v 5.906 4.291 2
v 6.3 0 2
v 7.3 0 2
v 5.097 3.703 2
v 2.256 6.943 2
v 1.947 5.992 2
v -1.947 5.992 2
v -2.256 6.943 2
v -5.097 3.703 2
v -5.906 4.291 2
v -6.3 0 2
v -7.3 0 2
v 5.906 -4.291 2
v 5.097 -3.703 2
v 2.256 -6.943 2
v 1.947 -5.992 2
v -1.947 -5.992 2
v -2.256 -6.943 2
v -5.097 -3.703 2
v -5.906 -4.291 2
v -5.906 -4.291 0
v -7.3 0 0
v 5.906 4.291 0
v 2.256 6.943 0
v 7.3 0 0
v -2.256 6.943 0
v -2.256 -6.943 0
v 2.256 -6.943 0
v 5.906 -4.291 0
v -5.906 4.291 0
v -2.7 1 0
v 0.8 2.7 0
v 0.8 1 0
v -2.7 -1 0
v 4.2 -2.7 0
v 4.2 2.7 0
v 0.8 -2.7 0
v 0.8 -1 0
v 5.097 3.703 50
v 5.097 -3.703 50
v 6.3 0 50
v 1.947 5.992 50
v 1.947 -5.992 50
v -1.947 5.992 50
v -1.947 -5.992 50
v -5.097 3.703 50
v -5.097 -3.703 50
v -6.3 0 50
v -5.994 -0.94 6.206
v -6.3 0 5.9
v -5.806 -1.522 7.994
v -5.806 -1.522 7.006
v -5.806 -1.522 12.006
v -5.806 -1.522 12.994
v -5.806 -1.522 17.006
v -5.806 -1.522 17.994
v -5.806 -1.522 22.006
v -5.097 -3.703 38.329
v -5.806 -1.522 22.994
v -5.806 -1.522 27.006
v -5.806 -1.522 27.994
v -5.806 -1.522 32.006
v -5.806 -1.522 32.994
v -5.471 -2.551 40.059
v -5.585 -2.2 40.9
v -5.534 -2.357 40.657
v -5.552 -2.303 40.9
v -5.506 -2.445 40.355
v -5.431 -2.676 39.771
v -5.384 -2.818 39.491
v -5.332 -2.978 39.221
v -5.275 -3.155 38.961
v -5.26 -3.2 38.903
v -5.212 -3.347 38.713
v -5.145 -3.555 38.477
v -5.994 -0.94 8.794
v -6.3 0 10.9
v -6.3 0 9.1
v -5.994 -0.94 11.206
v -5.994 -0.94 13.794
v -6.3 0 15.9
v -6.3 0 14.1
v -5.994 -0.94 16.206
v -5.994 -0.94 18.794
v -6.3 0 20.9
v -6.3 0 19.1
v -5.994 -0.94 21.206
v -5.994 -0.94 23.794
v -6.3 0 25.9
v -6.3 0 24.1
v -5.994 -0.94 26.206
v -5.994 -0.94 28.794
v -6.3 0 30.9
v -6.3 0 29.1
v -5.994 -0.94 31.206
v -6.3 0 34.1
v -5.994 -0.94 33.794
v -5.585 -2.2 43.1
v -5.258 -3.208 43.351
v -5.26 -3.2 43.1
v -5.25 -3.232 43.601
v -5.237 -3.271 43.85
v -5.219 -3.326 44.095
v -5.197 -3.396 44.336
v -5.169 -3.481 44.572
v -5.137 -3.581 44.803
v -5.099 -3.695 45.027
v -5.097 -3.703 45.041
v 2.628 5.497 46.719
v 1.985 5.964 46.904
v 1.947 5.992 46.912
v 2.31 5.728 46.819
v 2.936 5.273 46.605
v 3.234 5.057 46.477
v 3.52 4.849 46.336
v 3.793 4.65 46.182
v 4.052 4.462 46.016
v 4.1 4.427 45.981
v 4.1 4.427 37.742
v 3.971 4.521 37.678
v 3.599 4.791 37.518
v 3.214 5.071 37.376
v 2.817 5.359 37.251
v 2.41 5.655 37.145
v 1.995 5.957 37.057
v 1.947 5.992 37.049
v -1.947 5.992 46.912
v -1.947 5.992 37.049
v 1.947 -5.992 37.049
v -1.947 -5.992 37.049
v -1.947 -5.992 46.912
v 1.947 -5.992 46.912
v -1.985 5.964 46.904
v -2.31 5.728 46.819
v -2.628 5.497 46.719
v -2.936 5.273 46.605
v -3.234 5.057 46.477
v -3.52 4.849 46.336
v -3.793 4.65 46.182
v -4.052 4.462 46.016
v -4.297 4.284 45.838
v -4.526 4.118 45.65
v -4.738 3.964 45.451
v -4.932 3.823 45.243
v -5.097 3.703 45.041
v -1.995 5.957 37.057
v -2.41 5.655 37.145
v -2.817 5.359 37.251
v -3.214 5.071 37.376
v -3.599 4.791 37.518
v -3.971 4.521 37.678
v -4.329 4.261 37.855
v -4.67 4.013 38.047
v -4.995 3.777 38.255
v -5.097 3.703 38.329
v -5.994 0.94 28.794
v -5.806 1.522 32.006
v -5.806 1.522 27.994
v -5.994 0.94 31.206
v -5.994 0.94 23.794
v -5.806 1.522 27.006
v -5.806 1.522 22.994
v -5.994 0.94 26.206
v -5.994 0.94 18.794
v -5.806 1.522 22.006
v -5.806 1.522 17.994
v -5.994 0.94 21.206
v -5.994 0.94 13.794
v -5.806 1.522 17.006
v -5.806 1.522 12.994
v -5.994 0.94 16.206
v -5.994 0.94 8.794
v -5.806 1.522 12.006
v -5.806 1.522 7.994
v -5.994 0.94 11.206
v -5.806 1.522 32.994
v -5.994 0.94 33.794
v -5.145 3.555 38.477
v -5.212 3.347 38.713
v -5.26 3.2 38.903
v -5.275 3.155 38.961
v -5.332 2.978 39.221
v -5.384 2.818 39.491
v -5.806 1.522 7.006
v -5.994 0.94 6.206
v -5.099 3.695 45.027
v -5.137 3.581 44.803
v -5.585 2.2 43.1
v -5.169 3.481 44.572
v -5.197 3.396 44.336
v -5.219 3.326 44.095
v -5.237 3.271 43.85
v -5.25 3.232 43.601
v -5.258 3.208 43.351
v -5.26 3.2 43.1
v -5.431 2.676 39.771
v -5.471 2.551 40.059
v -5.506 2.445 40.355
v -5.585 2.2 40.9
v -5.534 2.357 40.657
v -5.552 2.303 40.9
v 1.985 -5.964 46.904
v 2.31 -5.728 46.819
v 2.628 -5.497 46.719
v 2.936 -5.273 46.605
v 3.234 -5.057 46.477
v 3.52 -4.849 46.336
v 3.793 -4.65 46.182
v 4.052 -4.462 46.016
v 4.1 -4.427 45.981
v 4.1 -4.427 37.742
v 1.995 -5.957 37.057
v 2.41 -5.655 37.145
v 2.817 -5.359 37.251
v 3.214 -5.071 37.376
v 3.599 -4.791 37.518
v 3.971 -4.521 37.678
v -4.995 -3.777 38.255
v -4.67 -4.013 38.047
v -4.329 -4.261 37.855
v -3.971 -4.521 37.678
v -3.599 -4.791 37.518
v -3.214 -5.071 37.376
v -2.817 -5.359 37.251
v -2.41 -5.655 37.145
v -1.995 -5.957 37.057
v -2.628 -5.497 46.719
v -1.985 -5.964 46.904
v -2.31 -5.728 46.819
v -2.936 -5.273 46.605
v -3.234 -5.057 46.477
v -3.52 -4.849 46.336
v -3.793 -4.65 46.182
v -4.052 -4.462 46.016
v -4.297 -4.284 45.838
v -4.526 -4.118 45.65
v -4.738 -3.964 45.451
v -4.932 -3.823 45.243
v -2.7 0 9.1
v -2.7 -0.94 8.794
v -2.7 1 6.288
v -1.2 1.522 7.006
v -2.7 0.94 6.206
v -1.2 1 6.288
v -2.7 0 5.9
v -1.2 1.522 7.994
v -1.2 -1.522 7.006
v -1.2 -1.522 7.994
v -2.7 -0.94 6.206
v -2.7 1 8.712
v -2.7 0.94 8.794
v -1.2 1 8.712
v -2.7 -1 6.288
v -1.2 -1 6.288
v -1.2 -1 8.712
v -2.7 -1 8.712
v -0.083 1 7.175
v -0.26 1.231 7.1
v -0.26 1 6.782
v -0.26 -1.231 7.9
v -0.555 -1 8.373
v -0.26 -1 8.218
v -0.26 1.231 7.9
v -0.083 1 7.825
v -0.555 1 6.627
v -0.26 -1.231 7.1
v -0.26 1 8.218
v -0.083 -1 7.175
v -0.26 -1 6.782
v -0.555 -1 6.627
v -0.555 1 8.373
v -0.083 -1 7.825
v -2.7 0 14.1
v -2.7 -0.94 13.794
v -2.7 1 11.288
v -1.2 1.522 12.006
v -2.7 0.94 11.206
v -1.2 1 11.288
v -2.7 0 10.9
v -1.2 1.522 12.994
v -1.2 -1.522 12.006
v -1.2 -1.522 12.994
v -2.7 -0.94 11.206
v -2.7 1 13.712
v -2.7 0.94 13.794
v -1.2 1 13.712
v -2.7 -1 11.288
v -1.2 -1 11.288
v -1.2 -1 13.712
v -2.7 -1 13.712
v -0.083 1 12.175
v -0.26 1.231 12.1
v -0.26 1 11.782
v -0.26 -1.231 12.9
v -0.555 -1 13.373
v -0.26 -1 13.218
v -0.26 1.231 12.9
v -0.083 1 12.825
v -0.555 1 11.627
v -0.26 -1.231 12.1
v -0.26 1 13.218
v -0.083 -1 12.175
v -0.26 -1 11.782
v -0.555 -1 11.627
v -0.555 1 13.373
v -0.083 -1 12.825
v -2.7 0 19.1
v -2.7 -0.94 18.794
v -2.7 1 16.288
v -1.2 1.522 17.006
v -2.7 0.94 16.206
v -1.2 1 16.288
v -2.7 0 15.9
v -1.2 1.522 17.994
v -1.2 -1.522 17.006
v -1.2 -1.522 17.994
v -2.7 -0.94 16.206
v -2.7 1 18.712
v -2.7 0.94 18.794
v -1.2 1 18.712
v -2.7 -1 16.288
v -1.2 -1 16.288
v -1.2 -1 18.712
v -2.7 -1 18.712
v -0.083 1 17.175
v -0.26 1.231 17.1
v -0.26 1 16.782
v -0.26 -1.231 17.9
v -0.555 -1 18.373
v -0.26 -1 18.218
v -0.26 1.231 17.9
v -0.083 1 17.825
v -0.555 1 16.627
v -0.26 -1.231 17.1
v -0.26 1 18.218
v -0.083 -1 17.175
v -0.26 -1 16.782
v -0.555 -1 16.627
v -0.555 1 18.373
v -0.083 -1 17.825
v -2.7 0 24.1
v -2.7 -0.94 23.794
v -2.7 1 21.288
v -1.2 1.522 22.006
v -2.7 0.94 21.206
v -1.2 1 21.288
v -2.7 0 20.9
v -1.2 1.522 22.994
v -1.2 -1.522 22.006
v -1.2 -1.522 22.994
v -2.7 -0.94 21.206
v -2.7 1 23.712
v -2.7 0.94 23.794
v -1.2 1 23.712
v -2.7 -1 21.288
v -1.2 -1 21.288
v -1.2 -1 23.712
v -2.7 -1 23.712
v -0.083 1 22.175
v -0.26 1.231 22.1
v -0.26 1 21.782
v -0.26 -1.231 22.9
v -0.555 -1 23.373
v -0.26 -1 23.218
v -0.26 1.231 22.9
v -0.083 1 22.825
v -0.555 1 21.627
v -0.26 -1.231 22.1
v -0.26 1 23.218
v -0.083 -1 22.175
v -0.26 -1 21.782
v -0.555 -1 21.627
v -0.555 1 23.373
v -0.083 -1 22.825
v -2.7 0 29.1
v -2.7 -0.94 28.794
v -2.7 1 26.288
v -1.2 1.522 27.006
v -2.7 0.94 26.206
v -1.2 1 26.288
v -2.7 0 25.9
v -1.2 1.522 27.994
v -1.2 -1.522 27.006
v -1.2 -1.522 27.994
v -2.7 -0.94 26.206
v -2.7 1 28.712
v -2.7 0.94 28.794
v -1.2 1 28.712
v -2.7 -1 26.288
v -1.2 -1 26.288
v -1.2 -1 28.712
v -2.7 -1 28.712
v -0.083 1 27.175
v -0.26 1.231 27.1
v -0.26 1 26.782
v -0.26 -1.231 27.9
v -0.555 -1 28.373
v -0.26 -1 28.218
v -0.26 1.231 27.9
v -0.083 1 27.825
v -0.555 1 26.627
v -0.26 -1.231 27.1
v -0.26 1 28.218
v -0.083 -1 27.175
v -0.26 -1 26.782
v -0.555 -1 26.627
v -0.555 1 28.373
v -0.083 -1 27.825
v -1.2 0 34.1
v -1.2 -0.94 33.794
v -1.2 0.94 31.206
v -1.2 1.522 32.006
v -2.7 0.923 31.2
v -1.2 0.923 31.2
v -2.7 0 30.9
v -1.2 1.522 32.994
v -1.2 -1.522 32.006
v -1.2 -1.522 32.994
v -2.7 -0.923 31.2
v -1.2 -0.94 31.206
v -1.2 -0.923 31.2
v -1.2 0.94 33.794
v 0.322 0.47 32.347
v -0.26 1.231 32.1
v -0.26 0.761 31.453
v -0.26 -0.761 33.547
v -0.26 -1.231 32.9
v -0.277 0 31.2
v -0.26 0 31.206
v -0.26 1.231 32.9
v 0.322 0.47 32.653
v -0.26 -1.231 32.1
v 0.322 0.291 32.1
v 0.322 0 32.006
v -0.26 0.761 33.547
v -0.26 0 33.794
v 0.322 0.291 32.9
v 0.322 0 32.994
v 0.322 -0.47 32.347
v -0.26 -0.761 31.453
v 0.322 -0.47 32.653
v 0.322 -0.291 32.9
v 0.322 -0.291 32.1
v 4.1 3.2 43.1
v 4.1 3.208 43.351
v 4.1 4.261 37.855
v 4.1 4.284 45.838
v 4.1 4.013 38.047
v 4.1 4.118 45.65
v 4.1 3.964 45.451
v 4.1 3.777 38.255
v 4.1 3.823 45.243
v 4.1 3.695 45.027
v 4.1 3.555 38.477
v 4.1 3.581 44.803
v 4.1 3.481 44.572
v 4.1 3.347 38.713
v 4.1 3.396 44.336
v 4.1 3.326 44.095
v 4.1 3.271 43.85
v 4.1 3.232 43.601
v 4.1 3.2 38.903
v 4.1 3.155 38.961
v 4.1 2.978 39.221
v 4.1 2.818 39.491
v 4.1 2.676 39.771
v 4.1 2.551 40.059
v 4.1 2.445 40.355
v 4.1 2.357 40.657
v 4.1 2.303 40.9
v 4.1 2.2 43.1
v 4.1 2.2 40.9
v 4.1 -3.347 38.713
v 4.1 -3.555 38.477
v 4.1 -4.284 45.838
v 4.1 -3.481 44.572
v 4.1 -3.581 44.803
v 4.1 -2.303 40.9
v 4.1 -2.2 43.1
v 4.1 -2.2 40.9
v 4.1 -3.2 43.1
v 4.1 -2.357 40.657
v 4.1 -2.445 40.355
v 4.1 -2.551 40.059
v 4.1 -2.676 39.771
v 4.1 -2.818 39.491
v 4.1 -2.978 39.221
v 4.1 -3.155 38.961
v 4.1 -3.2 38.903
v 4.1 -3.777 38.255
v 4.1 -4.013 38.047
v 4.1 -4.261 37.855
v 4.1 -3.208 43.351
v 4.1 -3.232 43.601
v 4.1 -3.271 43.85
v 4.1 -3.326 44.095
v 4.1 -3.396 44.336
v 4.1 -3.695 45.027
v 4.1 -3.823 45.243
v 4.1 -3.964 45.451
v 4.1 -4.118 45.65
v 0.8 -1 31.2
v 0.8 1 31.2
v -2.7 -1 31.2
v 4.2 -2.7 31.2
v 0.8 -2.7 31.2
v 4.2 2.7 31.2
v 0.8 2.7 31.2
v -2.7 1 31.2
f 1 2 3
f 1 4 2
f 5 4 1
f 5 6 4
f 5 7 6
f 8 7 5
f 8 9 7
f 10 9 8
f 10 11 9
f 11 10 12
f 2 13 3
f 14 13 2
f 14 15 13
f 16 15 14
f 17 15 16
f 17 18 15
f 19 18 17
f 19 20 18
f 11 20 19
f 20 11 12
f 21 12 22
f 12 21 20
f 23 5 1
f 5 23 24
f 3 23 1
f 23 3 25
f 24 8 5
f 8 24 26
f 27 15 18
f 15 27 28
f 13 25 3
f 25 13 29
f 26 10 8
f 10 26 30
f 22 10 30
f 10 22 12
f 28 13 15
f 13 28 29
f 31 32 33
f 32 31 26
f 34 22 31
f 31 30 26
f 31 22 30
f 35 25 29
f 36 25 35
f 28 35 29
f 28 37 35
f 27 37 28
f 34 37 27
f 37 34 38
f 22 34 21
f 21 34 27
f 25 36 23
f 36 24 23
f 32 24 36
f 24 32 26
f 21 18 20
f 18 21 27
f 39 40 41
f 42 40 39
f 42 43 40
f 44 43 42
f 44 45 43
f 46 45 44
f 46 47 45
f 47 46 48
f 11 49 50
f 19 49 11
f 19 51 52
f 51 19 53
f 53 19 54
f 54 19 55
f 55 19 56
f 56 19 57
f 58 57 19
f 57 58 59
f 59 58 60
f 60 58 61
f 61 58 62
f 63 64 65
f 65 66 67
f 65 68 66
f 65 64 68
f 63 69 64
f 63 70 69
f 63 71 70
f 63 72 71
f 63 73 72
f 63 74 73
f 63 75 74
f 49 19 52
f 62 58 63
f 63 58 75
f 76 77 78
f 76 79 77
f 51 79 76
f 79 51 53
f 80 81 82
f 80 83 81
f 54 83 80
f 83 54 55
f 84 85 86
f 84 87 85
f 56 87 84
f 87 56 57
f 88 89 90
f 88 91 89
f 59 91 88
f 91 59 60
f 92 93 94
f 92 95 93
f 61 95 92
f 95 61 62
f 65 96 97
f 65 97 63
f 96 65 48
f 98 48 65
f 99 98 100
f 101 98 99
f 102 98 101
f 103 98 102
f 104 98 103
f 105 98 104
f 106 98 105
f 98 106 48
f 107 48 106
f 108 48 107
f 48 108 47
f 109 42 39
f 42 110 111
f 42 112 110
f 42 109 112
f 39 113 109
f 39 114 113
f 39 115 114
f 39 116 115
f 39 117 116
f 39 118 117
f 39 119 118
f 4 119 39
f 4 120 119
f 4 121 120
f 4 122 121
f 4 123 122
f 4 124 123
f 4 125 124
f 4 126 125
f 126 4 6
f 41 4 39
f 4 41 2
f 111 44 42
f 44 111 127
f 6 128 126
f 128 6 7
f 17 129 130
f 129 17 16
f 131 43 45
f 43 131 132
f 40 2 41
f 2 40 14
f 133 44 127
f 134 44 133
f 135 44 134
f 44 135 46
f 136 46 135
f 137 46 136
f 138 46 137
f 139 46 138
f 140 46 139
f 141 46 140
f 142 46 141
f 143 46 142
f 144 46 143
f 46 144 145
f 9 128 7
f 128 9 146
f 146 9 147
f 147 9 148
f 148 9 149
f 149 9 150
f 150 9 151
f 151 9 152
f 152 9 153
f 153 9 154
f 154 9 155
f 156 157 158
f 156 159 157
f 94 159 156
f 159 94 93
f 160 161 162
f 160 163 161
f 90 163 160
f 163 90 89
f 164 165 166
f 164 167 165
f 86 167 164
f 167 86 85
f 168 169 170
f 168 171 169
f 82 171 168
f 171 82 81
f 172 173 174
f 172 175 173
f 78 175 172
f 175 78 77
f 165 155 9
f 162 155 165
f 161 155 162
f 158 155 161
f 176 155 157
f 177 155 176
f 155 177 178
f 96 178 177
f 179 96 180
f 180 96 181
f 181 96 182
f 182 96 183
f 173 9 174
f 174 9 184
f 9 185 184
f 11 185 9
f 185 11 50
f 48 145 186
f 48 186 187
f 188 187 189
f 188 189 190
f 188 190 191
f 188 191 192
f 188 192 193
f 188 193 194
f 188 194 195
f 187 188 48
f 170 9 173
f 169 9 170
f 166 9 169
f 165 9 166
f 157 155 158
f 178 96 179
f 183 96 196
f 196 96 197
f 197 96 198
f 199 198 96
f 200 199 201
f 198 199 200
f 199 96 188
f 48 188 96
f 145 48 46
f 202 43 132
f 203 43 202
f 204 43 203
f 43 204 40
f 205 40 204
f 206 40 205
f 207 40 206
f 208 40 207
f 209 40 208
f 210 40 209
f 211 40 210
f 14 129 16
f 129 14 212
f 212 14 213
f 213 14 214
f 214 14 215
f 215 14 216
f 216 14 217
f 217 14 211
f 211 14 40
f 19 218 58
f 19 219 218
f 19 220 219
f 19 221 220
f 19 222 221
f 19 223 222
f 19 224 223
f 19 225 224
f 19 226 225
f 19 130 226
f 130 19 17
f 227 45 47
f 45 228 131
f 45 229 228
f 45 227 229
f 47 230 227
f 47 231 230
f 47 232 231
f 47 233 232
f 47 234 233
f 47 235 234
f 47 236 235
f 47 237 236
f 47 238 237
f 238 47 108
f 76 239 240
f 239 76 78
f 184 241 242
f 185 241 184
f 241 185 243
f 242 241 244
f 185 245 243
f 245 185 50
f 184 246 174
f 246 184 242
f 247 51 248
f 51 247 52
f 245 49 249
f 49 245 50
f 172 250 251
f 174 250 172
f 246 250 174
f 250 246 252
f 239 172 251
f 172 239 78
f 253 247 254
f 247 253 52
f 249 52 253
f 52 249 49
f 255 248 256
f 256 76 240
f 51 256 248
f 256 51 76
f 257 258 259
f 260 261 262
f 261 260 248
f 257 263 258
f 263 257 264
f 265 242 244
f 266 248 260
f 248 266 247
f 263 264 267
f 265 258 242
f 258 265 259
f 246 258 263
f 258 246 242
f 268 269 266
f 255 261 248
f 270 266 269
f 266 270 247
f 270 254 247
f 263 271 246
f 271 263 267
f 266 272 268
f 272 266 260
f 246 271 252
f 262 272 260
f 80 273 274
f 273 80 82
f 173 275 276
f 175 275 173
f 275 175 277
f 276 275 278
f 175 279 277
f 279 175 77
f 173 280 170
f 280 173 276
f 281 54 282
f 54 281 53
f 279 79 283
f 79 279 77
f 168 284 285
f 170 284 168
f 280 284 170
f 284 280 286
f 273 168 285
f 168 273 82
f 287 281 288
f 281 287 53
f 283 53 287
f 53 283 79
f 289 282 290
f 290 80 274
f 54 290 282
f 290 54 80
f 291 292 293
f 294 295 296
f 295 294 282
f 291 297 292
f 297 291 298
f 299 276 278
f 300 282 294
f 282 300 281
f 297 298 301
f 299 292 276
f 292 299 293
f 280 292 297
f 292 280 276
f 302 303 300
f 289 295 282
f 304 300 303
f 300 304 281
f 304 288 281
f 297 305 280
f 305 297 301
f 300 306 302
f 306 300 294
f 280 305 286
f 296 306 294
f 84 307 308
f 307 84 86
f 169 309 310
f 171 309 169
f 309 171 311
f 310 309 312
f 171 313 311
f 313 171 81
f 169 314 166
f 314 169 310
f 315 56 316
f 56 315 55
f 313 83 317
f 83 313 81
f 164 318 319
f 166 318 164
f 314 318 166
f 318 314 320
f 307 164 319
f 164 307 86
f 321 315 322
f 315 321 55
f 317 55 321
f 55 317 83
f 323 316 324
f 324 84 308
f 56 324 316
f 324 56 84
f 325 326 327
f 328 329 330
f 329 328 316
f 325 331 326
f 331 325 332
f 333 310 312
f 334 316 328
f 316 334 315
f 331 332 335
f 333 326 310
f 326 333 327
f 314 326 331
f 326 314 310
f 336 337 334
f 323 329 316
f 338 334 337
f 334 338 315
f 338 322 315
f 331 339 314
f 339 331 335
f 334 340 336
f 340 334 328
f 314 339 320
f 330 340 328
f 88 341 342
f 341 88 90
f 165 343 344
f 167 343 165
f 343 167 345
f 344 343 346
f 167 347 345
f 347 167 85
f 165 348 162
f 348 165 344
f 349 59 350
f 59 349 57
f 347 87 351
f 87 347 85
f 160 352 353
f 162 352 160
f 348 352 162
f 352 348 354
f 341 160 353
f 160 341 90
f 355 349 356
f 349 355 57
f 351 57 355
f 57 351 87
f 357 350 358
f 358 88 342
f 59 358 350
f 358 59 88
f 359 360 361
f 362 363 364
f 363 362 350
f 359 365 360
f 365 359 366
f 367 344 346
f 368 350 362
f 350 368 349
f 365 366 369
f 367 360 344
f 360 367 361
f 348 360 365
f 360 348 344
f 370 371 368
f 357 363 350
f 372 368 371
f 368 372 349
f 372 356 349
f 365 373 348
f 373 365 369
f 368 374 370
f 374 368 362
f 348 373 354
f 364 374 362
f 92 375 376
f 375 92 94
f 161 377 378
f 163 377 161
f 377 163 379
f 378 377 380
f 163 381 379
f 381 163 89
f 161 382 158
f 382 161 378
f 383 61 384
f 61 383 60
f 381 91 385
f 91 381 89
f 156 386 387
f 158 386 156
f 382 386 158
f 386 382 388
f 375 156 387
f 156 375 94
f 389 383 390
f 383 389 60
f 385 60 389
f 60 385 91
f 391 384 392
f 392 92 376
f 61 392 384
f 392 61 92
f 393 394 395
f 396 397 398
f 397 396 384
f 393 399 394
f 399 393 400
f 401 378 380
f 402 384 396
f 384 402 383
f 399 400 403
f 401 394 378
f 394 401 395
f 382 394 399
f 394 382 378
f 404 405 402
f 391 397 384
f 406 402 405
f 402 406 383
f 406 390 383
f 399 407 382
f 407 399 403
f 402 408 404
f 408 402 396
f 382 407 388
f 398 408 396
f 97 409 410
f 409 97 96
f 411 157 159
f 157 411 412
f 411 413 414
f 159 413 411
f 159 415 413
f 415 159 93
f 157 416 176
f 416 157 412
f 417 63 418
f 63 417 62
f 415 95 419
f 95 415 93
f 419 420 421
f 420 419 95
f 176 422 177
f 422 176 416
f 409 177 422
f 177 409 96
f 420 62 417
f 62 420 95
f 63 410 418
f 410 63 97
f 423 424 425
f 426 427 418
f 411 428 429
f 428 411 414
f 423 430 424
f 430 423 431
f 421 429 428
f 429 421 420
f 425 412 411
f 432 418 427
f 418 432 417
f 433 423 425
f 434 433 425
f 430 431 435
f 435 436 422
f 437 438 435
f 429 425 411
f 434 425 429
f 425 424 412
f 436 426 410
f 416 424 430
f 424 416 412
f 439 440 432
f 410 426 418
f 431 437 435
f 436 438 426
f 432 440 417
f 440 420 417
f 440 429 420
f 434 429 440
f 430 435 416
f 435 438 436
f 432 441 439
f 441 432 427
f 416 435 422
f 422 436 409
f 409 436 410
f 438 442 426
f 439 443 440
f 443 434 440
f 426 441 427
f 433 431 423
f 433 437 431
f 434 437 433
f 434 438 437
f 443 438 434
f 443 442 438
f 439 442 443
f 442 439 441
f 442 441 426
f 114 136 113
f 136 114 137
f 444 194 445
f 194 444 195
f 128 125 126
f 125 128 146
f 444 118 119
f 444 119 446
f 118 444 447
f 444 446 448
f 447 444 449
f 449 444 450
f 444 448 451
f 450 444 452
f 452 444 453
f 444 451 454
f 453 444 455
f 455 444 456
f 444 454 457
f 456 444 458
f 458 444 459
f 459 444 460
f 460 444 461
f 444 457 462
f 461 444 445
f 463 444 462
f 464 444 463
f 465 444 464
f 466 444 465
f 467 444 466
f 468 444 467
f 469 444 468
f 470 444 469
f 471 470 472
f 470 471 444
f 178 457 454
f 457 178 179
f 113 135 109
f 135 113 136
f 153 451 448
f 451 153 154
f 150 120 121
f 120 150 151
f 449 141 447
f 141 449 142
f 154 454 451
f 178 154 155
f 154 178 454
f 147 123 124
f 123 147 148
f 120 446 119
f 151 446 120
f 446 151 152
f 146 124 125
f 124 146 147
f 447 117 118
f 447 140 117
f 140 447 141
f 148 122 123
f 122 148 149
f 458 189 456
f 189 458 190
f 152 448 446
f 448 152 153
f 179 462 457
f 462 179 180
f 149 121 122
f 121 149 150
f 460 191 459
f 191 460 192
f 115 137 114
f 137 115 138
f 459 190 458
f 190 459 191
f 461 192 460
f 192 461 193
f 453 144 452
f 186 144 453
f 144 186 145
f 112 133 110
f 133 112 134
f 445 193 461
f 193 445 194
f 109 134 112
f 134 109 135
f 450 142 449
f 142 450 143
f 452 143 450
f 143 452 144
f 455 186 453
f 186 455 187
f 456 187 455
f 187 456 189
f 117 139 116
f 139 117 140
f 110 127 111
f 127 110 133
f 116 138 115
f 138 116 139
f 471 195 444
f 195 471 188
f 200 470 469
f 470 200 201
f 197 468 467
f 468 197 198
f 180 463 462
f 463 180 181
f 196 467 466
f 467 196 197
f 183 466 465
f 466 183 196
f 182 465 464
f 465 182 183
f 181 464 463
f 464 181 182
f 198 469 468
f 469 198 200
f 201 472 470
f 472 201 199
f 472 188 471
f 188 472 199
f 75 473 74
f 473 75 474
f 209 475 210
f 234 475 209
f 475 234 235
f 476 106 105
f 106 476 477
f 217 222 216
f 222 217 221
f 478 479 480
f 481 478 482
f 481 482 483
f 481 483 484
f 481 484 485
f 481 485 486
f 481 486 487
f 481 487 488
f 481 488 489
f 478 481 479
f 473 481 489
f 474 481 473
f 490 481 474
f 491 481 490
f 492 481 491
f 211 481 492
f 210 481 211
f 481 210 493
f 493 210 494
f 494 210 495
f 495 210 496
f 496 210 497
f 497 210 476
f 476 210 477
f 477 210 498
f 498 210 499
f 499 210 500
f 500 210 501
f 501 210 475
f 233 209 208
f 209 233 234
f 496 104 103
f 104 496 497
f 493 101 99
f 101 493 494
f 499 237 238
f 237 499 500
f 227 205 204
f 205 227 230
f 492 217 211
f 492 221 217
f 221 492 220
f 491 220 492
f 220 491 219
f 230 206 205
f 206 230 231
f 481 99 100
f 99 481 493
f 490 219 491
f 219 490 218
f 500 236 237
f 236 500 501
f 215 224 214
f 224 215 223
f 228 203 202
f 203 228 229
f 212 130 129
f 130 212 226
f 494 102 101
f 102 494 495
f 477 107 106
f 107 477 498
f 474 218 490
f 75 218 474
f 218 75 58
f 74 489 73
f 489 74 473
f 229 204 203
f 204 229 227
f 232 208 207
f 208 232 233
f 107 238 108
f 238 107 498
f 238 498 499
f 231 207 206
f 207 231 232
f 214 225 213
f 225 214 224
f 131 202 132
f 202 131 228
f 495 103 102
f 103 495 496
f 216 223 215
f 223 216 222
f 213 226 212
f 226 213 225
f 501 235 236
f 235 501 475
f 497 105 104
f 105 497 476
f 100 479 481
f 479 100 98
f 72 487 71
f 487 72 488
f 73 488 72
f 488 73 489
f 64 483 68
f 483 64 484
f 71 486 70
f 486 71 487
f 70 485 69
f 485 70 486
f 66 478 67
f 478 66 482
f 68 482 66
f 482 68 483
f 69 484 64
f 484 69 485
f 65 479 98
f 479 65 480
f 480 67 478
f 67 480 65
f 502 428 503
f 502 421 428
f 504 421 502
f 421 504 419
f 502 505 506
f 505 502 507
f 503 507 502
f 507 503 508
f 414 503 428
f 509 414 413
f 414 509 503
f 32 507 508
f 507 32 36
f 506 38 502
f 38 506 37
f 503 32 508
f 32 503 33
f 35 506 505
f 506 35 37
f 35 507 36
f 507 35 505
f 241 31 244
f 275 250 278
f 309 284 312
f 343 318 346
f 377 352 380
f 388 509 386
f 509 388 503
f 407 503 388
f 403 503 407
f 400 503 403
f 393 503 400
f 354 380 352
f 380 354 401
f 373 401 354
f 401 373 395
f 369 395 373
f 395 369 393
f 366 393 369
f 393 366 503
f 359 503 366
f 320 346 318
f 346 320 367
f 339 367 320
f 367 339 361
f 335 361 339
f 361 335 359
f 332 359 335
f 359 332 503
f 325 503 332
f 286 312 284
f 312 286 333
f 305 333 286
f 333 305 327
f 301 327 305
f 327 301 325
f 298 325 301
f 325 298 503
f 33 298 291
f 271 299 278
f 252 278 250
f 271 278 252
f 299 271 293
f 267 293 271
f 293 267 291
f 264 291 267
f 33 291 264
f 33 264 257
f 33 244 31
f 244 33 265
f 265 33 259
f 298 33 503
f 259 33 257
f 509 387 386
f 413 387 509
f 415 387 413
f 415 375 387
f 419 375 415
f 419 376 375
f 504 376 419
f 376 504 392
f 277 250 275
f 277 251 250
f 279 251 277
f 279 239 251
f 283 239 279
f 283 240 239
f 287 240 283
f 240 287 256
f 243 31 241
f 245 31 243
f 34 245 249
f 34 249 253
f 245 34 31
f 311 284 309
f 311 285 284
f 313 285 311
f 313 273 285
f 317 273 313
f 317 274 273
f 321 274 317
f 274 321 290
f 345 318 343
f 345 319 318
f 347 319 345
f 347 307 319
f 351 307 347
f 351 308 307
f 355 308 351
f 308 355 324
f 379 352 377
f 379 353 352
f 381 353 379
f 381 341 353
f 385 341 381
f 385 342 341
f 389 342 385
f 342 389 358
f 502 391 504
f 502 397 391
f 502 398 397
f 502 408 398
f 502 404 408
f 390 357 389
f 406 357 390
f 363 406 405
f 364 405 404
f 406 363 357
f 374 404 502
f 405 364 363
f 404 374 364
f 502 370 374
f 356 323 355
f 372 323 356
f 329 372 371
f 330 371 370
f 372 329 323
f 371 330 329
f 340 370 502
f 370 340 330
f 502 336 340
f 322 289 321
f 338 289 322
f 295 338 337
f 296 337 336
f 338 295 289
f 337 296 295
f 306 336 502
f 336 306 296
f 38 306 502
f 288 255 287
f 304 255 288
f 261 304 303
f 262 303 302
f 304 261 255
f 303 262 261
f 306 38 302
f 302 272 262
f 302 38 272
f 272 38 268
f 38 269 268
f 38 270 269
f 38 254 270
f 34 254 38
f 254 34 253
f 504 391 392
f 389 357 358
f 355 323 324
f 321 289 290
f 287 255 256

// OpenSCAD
// file: util.scad
module space(size){
  minkowski() {
	children(0);
	cube(size, center=true);
    //sphere(size, center=true,$fn=30);  
  }
}

module pinHole(length){
    PIN_DIAMETER = 3.2;
    rotate([0,90,0]){
      cylinder(d=PIN_DIAMETER,h=length,center=false); //The lip
      translate([0,0,length])
        sphere(d=PIN_DIAMETER);  
    }
}

function coreDiameter() = 12.6;

function coreLipDiameter() = coreDiameter()+2;

function padlockWidth() = 3+8+8+12.6+3+3;

function padlockDepth() = 4+5+5+5+5+5+5+6+18;

function padlockHeight() = 24;

function pin1Depth() = 7.5;
function pin2Depth() = 12.5;
function pin3Depth() = 17.5;
function pin4Depth() = 22.5;
function pin5Depth() = 27.5;
function pin6Depth() = 32.5;
// file: bearing.scad
function bearingOuterDiameter() = 8; //The diameter of the circle facing the shackle
function bearingInnerDiameter() = 10; //The diameter of the circle facing the core


$fn=100;

height = 10;

module bearing(){

  difference(){
    cylinder(d=bearingOuterDiameter(),h=height);
    translate([0,-bearingOuterDiameter()/2,0])
      cube([bearingOuterDiameter(),bearingOuterDiameter(),height]);
  }
  
  translate([0,-bearingInnerDiameter()/2,0])
    cube([2,bearingInnerDiameter(),height]);
  translate([1,0,0])
    difference(){  
       cylinder(d=bearingInnerDiameter(),h=height);
       translate([-bearingInnerDiameter(),-bearingInnerDiameter()/2,0])
         cube([bearingInnerDiameter(),bearingInnerDiameter(),height]);
    }

}

bearing();
// file: key.scad
SHAFT_LENGTH = 28;
BOW_FLAT = 9;
KEY_HEIGHT = 3;

module keyShaftEnd(length){
    difference(){
      keyShaft(length);
      translate([-5,-5,length-4])
        rotate([35,0,0])
          cube([15,10,10]);
     
    }

}

module keyShaft(length){
    linear_extrude(height=length)
      polygon([[-0.5,0],[-0.5,KEY_HEIGHT],[4.5,KEY_HEIGHT],[4.5,0],[2.8,0],[2.8,-3.5],[1.2,-3.5],[1.2,0]]);
}

module keyBow(){
  linear_extrude(height=KEY_HEIGHT)  
      difference(){
        circle(d=20,$fn=100); 
        translate([-10,BOW_FLAT,0])  
          square([20,10]);
        translate([0,-5,0])    
          circle(d=5,$fn=100);  
      }
}

module key(){
   translate([-2,BOW_FLAT,KEY_HEIGHT]) 
     rotate([-90,0,0])
       keyShaft(SHAFT_LENGTH);
   translate([-2,BOW_FLAT+SHAFT_LENGTH-0.01,KEY_HEIGHT]) 
     rotate([-90,0,0])
       keyShaftEnd(4); 
   keyBow();    
}

key();

//keyShaftEnd(10);
// main file
$fn=10;
CORE_HEIGHT = 15+6+25+2;
LIP_HEIGHT = 2;
SNUGNESS = 0.2;

use <key.scad>
use <bearing.scad>
use <util.scad>



module core(){
    cylinder(d=coreLipDiameter(),h=LIP_HEIGHT,center=false); //The lip
    translate([0,0,LIP_HEIGHT])
      cylinder(d=coreDiameter(),h=CORE_HEIGHT,center=false); //The lip
}

module cutCore(){
    PIN_LENGTH = -11.2;
    difference(){
      core();

      translate([PIN_LENGTH,0,pin1Depth()]) //pin 1
        pinHole(10);  

      translate([PIN_LENGTH,0,pin2Depth()]) //pin 2
        pinHole(10);  

      translate([PIN_LENGTH,0,pin3Depth()]) //pin 3
        pinHole(10);  

      translate([PIN_LENGTH,0,pin4Depth()]) //pin 4
        pinHole(10);  

      translate([PIN_LENGTH,0,pin5Depth()]) //pin 5
        pinHole(10);  
        
      translate([PIN_LENGTH,0,pin6Depth()]) //pin 6
        pinHole(10);  
  

      translate([-6,coreDiameter()/2+1,4+25+6+3+5])  //Left bearing
        rotate([0,90,0])
          space(SNUGNESS)  
            bearing();

      translate([-6,-coreDiameter()/2-1,4+25+6+3+5]) //Right bearing
        rotate([0,90,0])
          space(SNUGNESS)  
            bearing();


      rotate([0,0,-90]) //Key shaft
        translate([-2,1,0])
          space(2*SNUGNESS)  
            keyShaft(4+25+2);  
    
    }
}

cutCore();
